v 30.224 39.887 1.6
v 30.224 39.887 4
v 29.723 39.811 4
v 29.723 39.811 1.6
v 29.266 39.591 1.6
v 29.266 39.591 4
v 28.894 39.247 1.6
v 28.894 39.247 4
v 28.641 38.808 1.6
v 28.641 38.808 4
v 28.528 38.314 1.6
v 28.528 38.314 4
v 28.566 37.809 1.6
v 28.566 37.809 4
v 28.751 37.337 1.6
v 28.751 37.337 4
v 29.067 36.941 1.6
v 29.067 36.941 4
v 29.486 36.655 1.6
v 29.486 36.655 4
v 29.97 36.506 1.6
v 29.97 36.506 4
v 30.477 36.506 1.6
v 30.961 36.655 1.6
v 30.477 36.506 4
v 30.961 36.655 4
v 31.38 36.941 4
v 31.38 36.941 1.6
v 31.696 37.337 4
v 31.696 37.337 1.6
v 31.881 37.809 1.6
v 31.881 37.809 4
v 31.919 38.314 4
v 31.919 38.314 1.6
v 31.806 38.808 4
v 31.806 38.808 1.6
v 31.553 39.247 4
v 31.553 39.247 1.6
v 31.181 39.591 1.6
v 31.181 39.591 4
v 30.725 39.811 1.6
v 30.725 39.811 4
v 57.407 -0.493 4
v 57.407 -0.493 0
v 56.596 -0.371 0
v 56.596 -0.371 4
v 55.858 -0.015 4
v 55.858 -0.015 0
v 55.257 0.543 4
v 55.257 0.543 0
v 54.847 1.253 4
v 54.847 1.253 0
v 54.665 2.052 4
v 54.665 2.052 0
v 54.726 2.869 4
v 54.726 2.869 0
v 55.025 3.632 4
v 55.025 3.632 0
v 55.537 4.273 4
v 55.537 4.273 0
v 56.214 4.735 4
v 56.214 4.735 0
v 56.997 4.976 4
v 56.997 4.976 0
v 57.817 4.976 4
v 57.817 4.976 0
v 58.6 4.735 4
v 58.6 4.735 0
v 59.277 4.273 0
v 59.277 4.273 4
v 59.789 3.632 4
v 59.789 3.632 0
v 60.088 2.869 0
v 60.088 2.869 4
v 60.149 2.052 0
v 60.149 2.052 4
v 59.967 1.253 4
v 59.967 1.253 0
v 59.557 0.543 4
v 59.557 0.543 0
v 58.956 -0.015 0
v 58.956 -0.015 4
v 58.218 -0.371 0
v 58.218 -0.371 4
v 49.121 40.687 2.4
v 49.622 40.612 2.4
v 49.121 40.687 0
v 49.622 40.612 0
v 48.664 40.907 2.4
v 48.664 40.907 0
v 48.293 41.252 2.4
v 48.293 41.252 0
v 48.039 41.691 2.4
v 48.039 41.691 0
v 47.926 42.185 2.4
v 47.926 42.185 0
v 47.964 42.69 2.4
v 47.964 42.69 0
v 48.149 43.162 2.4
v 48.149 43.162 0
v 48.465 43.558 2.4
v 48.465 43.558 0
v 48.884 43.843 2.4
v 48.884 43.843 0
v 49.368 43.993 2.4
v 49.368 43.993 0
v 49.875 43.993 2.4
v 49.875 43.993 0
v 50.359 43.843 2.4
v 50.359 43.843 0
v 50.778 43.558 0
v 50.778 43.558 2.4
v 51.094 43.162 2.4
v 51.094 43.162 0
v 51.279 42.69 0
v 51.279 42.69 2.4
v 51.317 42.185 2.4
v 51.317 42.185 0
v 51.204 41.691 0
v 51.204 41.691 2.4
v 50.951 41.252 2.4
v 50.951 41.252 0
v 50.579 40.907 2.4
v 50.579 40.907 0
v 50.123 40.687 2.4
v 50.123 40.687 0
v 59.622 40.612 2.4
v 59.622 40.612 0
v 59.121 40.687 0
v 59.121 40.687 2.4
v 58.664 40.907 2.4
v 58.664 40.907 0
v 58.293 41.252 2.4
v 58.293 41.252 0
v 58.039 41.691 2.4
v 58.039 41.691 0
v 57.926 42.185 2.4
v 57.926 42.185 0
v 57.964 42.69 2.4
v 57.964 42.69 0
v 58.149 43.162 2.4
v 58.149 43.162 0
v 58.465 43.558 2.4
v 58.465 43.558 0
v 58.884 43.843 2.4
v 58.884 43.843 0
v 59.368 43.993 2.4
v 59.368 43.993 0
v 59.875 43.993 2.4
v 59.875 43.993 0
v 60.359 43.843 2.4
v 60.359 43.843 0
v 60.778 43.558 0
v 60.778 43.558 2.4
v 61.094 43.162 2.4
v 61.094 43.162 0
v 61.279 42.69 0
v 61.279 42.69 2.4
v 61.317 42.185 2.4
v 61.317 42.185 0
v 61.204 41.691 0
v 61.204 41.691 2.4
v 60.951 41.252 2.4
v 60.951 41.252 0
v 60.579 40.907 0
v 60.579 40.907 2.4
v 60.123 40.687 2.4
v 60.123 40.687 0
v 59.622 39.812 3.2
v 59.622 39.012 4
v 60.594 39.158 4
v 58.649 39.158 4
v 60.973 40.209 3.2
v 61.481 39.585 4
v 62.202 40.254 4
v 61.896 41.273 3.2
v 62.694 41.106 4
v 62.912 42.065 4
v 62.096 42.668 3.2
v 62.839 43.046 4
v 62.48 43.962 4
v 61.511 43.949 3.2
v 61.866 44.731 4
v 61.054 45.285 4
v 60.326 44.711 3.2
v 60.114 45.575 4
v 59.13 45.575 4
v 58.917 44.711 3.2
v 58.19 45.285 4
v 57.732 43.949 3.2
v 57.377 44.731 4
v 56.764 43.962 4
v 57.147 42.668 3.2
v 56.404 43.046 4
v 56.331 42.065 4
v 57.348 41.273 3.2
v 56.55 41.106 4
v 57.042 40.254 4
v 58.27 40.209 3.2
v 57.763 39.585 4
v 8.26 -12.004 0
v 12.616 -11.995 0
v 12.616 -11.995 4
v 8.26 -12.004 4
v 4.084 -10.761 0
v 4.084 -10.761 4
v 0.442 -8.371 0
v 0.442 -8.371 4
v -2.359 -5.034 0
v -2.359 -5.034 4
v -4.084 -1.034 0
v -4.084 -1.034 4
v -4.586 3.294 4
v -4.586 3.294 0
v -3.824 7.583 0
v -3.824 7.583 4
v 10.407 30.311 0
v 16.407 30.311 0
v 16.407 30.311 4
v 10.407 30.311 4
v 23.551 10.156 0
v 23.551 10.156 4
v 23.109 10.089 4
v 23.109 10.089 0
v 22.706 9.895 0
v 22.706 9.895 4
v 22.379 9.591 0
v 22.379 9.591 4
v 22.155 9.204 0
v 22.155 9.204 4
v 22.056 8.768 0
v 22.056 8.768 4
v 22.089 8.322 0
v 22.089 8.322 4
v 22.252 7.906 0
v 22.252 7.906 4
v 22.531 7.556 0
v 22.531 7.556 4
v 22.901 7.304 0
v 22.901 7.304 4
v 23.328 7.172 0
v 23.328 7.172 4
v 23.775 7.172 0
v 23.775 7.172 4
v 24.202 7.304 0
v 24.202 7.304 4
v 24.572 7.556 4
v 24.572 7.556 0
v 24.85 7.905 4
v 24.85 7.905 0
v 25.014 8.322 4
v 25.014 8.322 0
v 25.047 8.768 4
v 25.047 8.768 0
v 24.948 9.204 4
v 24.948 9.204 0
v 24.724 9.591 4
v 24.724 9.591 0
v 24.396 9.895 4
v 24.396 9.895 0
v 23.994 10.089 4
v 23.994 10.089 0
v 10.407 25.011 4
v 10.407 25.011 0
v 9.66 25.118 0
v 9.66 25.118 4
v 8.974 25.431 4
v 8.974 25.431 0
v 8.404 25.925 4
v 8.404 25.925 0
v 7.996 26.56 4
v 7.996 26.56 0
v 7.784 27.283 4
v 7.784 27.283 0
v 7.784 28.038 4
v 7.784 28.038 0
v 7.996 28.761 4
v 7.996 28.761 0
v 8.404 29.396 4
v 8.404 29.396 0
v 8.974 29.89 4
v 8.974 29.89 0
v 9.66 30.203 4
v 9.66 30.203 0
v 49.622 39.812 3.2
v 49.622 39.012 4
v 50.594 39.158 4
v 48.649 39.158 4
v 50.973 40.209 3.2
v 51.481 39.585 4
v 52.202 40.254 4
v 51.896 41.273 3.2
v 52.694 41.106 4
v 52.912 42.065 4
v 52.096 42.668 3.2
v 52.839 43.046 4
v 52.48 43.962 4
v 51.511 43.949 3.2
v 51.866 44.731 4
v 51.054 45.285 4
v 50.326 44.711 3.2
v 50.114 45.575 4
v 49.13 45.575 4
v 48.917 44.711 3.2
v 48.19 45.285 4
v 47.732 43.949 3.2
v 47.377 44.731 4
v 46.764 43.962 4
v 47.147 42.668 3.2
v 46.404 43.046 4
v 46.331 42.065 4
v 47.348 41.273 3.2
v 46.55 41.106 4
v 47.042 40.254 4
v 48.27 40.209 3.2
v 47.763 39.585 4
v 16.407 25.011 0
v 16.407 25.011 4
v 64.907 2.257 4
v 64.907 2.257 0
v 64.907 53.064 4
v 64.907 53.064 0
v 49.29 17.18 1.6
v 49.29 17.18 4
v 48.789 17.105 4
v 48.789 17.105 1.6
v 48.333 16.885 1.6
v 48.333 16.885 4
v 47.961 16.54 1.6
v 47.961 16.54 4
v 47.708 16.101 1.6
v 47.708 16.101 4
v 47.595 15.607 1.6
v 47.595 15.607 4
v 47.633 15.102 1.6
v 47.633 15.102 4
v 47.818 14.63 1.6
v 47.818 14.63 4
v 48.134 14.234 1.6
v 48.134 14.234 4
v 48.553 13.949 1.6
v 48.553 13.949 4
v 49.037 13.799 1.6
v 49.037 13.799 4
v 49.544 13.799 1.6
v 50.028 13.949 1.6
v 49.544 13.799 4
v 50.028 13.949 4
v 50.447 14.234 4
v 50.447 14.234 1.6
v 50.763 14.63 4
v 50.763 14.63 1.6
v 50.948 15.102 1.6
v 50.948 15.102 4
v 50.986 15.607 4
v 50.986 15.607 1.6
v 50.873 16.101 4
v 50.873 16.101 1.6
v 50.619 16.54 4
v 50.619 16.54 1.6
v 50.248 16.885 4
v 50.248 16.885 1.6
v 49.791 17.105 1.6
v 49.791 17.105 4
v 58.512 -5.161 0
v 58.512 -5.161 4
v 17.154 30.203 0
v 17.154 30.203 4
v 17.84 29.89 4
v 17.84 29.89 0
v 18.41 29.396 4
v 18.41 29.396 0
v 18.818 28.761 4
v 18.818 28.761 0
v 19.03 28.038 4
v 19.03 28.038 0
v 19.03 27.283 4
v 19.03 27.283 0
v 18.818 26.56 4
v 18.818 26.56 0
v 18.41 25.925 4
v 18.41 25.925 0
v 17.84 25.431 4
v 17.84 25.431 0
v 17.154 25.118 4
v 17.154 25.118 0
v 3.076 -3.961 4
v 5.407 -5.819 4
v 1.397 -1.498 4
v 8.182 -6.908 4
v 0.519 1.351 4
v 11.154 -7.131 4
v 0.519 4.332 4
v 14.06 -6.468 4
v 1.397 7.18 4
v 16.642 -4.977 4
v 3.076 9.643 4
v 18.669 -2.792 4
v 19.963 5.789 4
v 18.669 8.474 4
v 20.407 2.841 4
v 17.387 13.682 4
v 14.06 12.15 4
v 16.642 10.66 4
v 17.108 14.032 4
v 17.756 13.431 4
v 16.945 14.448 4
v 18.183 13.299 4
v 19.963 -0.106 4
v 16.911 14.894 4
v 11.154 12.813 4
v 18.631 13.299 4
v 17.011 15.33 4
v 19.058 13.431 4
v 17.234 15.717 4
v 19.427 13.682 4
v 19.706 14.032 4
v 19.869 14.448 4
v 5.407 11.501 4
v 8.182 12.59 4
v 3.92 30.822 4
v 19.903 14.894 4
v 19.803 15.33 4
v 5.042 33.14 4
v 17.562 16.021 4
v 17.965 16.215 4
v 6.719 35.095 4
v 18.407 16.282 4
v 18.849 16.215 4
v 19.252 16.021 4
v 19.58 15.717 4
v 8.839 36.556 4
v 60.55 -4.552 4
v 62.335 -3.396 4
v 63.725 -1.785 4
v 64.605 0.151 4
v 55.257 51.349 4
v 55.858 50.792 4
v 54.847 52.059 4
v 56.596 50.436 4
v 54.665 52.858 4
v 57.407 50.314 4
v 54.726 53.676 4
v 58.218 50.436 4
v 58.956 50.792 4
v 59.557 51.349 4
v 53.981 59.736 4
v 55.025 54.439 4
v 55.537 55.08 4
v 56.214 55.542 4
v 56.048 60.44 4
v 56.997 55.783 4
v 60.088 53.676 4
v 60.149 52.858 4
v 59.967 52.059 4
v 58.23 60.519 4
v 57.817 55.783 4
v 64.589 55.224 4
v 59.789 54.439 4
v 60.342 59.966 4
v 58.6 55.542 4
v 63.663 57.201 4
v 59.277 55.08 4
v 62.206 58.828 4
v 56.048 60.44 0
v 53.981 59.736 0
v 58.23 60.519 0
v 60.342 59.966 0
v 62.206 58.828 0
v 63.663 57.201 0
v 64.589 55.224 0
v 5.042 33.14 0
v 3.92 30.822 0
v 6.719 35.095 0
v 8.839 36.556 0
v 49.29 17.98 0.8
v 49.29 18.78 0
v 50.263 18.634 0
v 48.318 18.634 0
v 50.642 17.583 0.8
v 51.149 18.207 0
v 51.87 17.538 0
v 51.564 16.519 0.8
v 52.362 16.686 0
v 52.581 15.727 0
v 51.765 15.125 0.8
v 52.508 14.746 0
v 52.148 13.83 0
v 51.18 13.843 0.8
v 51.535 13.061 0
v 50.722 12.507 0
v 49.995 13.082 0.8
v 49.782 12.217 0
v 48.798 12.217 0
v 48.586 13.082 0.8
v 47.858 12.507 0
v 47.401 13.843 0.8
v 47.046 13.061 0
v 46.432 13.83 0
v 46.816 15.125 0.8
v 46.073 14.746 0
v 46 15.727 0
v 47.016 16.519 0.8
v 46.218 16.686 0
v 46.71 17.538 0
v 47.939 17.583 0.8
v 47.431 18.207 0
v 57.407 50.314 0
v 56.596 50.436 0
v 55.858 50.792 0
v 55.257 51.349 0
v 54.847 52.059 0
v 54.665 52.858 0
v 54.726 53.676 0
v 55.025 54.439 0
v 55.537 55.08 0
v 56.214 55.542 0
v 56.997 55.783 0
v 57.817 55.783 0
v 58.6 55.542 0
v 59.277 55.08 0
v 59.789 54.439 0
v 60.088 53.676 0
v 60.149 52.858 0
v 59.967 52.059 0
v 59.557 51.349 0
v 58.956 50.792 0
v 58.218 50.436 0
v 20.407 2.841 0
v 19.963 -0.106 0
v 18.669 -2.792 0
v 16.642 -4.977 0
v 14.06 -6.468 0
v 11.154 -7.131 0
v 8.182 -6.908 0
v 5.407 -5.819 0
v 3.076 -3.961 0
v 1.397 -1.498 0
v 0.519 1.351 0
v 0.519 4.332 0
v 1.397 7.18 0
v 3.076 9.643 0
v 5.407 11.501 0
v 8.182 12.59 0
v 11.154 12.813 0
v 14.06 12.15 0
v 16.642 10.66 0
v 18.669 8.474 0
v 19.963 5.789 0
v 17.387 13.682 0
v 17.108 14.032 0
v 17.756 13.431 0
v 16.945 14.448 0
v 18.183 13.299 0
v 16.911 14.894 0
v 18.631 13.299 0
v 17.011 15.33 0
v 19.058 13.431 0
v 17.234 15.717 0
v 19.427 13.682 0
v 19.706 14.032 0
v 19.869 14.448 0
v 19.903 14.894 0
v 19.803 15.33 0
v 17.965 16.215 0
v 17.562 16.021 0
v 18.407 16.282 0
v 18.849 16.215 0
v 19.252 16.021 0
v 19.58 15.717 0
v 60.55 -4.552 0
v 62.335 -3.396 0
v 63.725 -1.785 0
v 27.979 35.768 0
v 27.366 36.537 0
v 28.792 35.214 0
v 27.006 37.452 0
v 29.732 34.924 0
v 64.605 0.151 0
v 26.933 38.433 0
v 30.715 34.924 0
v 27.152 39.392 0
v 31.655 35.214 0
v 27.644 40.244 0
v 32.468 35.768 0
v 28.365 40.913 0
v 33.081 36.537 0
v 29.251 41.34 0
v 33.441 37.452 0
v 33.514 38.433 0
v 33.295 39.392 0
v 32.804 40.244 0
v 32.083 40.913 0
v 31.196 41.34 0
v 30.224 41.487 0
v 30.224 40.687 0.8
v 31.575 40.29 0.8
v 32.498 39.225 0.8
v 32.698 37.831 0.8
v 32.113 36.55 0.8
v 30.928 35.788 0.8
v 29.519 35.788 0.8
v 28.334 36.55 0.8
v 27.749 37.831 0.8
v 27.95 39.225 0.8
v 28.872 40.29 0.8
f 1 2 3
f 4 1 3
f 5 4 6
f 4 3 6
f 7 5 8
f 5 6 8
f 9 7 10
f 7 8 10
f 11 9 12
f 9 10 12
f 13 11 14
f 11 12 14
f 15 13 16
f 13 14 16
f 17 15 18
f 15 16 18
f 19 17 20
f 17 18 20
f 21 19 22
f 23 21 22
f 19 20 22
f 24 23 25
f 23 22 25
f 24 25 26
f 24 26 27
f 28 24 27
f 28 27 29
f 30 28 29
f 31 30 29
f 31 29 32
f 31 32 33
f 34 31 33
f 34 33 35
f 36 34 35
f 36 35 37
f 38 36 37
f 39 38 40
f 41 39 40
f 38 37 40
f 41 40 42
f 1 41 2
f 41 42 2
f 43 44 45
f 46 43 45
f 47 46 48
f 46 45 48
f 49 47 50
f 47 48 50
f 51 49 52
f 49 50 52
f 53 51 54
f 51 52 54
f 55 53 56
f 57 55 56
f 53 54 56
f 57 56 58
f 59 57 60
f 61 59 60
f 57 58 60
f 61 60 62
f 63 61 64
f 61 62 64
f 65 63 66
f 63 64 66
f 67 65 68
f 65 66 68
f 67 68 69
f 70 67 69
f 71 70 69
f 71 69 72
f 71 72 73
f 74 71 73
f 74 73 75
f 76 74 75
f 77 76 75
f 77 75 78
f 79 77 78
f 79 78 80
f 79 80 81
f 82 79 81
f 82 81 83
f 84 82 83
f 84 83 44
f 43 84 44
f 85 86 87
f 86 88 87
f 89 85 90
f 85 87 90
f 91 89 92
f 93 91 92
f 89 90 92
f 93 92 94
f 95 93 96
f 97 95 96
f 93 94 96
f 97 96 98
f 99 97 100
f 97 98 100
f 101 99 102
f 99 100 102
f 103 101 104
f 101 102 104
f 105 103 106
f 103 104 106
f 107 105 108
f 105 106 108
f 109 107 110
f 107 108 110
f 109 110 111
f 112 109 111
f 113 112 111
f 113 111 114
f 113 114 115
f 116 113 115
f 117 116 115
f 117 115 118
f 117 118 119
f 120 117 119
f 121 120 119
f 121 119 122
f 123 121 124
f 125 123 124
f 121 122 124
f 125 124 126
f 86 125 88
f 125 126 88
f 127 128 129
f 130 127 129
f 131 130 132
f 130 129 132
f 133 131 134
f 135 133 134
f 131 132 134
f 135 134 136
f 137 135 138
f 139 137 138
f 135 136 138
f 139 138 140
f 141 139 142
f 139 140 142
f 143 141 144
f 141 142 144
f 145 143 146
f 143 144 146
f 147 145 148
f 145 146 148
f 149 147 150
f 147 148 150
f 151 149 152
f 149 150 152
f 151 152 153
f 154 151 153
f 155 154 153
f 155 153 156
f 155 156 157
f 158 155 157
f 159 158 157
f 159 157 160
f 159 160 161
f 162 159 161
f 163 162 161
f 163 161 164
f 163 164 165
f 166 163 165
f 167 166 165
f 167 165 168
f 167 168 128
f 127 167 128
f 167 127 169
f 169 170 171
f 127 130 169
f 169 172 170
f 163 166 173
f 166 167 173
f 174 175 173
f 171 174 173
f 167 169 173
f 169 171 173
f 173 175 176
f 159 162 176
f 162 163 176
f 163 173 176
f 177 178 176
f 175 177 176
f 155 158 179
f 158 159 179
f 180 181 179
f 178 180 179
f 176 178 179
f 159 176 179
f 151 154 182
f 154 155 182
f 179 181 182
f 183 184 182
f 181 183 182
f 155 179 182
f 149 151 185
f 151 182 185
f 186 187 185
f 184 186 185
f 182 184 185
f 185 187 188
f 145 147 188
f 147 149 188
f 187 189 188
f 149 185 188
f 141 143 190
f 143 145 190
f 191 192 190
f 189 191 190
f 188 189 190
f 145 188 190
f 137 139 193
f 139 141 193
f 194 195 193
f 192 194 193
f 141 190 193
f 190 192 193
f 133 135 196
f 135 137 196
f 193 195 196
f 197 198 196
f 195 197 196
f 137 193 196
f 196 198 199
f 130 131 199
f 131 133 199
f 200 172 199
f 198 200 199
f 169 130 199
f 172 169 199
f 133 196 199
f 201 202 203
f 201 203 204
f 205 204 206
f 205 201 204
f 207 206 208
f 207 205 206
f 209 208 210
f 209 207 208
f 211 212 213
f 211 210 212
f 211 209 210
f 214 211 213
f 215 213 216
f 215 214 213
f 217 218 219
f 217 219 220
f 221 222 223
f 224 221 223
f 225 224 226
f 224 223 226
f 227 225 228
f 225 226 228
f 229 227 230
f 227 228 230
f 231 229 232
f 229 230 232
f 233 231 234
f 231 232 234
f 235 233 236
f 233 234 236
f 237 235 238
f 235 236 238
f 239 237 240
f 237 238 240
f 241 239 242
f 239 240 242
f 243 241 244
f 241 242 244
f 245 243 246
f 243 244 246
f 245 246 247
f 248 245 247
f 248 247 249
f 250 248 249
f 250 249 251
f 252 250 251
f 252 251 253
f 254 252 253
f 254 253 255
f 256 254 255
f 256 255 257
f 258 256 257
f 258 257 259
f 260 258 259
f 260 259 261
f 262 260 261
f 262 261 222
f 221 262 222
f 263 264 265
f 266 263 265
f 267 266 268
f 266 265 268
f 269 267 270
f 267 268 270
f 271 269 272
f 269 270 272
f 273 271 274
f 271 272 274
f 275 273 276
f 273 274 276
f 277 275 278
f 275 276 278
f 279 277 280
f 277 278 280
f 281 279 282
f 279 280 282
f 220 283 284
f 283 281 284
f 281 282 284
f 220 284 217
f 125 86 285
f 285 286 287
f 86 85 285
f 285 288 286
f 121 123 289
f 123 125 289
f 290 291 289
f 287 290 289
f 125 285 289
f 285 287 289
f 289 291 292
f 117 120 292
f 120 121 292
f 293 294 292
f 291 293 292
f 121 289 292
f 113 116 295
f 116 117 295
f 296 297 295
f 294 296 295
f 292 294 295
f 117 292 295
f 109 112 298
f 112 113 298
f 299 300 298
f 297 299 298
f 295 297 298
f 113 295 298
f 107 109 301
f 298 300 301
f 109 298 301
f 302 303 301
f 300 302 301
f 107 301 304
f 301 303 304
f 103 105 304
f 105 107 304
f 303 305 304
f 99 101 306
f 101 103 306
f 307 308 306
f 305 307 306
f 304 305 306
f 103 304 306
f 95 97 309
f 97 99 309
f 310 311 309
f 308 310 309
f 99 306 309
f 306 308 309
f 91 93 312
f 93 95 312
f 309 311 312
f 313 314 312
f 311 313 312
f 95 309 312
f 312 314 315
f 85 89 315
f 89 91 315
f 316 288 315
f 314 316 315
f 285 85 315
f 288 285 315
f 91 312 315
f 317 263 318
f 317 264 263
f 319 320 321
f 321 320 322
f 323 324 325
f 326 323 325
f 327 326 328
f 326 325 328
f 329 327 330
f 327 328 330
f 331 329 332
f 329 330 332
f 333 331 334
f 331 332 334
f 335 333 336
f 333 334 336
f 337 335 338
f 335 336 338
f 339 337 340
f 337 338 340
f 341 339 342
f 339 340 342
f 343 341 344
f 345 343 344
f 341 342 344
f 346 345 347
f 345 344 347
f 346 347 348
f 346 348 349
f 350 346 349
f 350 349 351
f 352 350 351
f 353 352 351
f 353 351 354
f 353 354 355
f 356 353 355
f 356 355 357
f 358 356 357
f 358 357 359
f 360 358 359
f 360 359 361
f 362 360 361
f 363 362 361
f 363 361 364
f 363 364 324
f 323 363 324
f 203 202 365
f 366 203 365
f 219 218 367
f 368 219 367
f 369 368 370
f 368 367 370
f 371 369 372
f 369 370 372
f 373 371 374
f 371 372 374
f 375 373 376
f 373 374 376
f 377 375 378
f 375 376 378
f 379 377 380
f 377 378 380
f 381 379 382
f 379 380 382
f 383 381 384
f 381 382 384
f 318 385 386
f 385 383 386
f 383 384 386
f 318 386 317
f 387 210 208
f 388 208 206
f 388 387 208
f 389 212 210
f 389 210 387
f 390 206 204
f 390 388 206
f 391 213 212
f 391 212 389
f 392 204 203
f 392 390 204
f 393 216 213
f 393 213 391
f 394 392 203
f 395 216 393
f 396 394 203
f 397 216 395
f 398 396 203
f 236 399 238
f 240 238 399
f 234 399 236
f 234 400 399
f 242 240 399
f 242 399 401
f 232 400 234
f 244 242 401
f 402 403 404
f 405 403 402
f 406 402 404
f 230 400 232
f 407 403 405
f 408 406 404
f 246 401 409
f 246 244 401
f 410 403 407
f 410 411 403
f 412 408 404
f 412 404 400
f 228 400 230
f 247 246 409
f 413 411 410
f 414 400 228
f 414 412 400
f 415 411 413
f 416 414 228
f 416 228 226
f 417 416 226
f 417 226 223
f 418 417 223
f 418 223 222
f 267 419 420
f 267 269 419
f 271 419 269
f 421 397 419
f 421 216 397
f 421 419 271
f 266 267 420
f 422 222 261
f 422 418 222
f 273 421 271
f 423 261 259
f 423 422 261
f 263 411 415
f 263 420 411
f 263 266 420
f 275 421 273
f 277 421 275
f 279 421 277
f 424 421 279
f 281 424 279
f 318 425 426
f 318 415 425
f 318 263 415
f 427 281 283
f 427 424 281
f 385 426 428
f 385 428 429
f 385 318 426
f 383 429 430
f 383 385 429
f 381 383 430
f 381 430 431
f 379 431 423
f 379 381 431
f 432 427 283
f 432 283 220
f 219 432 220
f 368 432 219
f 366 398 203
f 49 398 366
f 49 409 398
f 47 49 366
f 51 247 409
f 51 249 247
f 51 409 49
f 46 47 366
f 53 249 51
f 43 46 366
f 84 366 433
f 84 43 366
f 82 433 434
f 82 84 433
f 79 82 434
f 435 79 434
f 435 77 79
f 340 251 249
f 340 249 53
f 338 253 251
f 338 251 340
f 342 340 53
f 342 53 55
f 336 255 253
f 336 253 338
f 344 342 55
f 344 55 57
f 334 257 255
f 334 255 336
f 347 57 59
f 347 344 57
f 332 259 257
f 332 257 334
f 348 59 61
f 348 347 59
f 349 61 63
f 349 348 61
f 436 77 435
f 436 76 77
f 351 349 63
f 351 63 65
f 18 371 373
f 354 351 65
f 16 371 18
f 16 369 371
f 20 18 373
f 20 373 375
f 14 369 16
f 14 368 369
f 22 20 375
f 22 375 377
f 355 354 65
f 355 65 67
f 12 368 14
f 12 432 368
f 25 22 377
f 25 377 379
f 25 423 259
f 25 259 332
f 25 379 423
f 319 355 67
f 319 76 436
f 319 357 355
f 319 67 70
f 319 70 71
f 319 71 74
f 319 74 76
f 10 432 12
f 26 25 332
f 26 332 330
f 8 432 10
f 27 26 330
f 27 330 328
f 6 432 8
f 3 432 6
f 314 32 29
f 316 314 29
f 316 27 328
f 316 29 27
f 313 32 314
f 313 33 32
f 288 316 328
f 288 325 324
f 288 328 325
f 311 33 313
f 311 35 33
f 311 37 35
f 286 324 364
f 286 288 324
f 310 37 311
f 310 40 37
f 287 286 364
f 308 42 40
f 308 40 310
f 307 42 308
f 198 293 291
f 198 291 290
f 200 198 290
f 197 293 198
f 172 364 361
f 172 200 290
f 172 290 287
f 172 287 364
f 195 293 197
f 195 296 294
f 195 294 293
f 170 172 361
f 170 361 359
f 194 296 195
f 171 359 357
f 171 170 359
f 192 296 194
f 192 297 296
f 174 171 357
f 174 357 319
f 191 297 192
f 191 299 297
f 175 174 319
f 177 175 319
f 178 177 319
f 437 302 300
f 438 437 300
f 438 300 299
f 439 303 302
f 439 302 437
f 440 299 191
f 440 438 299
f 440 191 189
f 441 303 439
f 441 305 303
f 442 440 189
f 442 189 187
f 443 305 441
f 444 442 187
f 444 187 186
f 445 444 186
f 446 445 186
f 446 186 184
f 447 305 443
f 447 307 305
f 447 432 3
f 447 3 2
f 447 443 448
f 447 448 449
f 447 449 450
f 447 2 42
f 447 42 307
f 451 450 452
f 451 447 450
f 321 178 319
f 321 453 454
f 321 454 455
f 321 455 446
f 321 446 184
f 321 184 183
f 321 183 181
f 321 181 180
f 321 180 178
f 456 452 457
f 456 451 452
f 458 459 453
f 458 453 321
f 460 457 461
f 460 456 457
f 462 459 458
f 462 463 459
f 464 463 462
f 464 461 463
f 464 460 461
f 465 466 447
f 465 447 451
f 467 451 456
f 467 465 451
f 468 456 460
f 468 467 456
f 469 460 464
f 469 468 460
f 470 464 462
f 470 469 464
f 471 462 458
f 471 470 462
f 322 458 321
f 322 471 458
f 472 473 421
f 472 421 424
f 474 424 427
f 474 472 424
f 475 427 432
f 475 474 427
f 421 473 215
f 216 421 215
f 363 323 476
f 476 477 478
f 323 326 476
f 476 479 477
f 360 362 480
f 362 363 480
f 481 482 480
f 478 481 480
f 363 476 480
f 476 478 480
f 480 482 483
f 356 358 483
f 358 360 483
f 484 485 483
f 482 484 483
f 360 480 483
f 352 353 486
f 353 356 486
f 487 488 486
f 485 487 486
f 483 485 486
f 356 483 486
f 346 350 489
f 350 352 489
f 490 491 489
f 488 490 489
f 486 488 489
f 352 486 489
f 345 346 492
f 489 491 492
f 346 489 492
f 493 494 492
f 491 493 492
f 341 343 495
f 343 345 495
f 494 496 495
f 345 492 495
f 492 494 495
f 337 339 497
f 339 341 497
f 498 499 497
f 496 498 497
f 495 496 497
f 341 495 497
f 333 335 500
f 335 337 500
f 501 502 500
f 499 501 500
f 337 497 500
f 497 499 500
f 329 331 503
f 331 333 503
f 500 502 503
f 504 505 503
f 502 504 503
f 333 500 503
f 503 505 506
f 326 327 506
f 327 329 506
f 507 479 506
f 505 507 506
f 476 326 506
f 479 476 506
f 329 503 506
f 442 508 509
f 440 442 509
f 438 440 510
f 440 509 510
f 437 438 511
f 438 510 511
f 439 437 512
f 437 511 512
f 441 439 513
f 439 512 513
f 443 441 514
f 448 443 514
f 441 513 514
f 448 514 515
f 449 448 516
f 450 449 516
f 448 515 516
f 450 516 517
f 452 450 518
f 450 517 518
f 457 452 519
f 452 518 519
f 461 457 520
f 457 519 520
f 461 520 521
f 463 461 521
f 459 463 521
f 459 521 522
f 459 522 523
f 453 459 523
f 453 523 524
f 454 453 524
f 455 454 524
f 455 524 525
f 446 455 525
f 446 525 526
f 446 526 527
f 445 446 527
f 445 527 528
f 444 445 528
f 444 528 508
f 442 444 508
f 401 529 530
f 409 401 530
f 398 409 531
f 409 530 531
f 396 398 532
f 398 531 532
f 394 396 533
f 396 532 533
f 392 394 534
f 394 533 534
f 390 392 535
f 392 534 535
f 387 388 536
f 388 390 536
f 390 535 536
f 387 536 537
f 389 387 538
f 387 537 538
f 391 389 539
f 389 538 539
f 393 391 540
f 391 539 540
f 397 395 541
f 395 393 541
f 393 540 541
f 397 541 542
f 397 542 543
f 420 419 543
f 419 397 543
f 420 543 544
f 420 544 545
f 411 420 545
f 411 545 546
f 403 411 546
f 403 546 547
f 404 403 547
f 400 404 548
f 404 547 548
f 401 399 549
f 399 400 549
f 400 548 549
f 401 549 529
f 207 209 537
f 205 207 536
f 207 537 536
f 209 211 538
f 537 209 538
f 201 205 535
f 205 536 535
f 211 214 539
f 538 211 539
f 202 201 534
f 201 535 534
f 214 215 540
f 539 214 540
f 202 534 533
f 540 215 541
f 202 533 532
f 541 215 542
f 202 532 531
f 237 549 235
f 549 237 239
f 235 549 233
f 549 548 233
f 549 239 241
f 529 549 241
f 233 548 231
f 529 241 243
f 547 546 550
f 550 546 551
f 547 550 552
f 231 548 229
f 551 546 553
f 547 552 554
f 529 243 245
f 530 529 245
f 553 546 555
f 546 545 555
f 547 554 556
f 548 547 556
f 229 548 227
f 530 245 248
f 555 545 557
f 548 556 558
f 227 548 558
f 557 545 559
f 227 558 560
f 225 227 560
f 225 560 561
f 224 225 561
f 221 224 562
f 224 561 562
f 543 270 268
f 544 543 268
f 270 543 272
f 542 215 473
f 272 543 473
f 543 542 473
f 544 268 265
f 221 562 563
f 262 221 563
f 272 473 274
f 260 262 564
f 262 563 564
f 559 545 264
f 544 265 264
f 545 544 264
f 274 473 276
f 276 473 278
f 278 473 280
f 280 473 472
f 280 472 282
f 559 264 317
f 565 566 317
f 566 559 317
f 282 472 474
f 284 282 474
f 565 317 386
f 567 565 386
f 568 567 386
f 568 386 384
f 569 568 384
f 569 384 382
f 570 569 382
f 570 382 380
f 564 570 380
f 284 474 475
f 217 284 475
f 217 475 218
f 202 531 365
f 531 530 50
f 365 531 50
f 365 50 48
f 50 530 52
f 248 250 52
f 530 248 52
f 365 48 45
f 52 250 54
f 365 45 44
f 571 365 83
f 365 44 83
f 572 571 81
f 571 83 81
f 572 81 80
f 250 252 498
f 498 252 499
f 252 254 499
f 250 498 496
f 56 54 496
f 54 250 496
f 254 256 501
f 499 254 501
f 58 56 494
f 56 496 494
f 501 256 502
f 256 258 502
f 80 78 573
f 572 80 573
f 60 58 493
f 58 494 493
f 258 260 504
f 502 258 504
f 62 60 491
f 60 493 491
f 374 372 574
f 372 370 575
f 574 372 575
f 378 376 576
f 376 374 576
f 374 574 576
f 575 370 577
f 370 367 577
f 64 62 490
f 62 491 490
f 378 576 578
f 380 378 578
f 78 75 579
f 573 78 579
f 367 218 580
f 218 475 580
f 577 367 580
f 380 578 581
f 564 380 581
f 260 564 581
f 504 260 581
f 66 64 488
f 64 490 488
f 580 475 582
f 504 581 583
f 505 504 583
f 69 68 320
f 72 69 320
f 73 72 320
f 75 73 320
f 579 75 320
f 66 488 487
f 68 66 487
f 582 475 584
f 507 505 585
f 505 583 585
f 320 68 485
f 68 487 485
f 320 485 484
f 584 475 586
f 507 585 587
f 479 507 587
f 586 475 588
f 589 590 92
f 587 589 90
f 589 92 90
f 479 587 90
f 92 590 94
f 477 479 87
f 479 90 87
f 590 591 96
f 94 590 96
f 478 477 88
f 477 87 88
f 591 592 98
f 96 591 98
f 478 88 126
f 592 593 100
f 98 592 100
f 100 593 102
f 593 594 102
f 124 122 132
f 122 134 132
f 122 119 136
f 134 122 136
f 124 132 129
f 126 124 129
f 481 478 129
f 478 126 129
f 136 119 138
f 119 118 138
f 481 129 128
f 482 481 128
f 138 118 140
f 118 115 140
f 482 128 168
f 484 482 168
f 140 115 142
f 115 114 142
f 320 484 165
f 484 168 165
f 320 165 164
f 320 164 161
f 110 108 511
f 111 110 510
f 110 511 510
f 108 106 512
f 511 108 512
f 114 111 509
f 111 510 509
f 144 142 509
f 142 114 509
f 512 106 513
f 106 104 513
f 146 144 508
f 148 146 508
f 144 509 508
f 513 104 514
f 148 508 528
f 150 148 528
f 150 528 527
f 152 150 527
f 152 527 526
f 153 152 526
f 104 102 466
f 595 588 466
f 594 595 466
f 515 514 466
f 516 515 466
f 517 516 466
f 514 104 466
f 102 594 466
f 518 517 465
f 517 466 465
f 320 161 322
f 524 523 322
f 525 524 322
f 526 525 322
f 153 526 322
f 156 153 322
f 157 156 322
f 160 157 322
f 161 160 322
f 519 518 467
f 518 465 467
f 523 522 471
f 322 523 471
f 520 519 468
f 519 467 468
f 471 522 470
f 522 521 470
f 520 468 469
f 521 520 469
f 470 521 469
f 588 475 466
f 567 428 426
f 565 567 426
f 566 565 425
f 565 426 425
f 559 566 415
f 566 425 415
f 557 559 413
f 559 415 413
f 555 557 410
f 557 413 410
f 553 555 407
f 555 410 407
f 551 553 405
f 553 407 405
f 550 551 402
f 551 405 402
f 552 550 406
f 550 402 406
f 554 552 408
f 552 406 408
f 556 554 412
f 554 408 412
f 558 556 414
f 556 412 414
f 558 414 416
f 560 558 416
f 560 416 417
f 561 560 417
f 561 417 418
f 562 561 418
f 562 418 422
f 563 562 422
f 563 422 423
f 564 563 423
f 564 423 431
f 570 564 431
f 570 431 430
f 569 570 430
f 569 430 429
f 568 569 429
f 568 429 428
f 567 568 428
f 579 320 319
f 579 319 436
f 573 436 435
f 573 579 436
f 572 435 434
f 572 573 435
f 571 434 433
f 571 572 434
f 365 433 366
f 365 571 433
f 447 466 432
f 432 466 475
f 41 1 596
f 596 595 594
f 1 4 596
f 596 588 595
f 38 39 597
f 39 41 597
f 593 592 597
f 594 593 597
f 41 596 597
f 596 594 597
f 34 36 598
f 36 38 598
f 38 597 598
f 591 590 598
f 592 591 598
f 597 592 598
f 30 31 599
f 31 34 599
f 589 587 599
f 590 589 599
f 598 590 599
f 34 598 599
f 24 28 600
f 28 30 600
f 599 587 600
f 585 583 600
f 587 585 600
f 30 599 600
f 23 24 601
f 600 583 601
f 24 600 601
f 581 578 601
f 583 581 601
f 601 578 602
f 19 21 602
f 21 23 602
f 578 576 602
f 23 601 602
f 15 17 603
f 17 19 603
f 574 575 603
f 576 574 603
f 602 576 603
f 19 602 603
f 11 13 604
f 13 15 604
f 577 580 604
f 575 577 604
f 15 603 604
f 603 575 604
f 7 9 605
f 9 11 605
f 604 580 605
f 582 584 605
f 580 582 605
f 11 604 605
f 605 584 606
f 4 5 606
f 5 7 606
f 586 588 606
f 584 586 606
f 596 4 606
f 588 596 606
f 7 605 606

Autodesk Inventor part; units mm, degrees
ref_plane "YZ Plane" through (0, 0, 0) normal (1, 0, 0) x (0, 1, 0)
ref_plane "XZ Plane" through (0, 0, 0) normal (0, 1, 0) x (-1, 0, 0)
ref_plane "XY Plane" through (0, 0, 0) normal (0, 0, 1) x (1, 0, 0)
sketch "Sketch1" plane through (0, 0, 0) normal (0, 0, 1) x (1, 0, 0)
  circle A0 centre (57.407, 53.064) radius 2.5 projected
  circle A1 centre (57.407, 53.064) radius 10 projected
  circle A2 centre (13.407, 27.6606) radius 2.5 projected
  circle A3 centre (13.407, 27.6606) radius 10 projected
  circle A4 centre (57.407, 2.2572) radius 2.5 projected
  circle A5 centre (57.407, 2.2572) radius 10 projected
  line L0 (25.407, -164.9104) -> (25.407, 85.0896) construction
  arc A6 (64.907, 53.064) -> (53.9811, 59.7359) centre (57.407, 53.064) ccw
  arc A7 (58.5116, -5.161) -> (64.907, 2.2572) centre (57.407, 2.2572) ccw
  line L1 (10.407, 27.6606) -> (16.407, 27.6606) construction
  line L2 (10.407, 25.0106) -> (16.407, 25.0106)
  line L3 (16.407, 30.3106) -> (10.407, 30.3106)
  arc A8 (10.407, 30.3106) -> (10.407, 25.0106) centre (10.407, 27.6606) ccw
  arc A9 (16.407, 25.0106) -> (16.407, 30.3106) centre (16.407, 27.6606) ccw
  circle A10 centre (10.407, 2.8412) radius 10
  arc A11 (-3.8238, 7.5832) -> (12.6162, -11.9952) centre (10.407, 2.8412) ccw
  line L4 (12.6162, -11.9952) -> (58.5116, -5.161)
  line L5 (53.9811, 59.7359) -> (8.8392, 36.5564)
  line L6 (64.907, 2.2572) -> (64.907, 53.064)
  line L7 (3.9198, 30.8219) -> (-3.8238, 7.5832)
  line L8 (-3.8238, 7.5832) -> (-11.5466, -15.5932) construction
  line L9 (12.6162, -11.9952) -> (-11.5466, -15.5932) construction
  line L10 (-11.5466, -15.5932) -> (31.917, 20.9033) construction
  point P0 (18.407, 14.782)
  point P1 (23.5514, 8.6555)
  dimension "d52" = 15
  dimension "d53" = 15
  dimension "d54" = 3
  dimension "d55" = 5.3
  dimension "d56" = 20
  dimension "d57" = 30
  dimension "d58" = 4
  dimension "d59" = 8
extrude "Extrusion1" add sketch "Sketch1" along normal blind 4 contours A0 | L5 A6 L6 A1 | A1 L6 A5 L4 A11 L7 A3 L5 | A3 | L6 A7 L4 A5 | A4 picked at (52.4239, 56.8921) picked at (55.6672, -3.7922)
sketch "Sketch2" plane through (0, 0, 4) normal (0, 0, 1) x (1, 0, 0)
  circle A0 centre (13.407, 27.6606) radius 2.5 projected
  circle A1 centre (57.407, 2.2572) radius 2.5 projected
  circle A2 centre (57.407, 53.064) radius 2.5 projected
  line L0 (10.407, 27.6606) -> (16.407, 27.6606) construction
  line L1 (10.407, 24.9106) -> (16.407, 24.9106)
  line L2 (16.407, 30.4106) -> (10.407, 30.4106)
  arc A3 (10.407, 30.4106) -> (10.407, 24.9106) centre (10.407, 27.6606) ccw
  arc A4 (16.407, 24.9106) -> (16.407, 30.4106) centre (16.407, 27.6606) ccw
  point P0 (0, 0)
  dimension "d25" = 3
  dimension "d26" = 5.5
hole "Hole2" at (57.407, 53.064, 4) at (57.407, 2.2572, 4) direction (0, 0, -1) diameter 5.5 end through all clearance for "Countersunk Head GOST 12876-67" size "M5" standard "GOST"
hole "Hole4" at (18.407, 14.782, 0) at (23.5514, 8.6555, 0) direction (0, 0, 1) diameter 3 end through all
sketch "Sketch6" plane through (0, 0, 0) normal (0, 0, -1) x (-1, 0, 0)
  circle A0 centre (-49.2903, 15.4803) radius 1.7 projected
  circle A1 centre (-30.2236, 38.1868) radius 1.7 projected
  point P0 (0, 0)
hole "Hole6" at (49.2903, 15.4803, 0) at (30.2236, 38.1868, 0) direction (0, 0, 1) diameter 3.4 end through all countersink diameter 6.6 countersink angle 90 clearance for "Countersunk Head GOST 12876-67" size "M3" standard "GOST"
sketch "Sketch7" plane through (0, 0, 4) normal (0, 0, 1) x (1, 0, 0)
  point P0 (0, 0)
  point P1 (49.6217, 42.3118)
  point P2 (59.6217, 42.3118)
hole "Hole7" at (59.6217, 42.3118, 4) at (49.6217, 42.3118, 4) direction (0, 0, -1) diameter 3.4 end through all countersink diameter 6.6 countersink angle 90 clearance for "Countersunk Head GOST 12876-67" size "M3" standard "GOST"
properties part number "plate_3"
